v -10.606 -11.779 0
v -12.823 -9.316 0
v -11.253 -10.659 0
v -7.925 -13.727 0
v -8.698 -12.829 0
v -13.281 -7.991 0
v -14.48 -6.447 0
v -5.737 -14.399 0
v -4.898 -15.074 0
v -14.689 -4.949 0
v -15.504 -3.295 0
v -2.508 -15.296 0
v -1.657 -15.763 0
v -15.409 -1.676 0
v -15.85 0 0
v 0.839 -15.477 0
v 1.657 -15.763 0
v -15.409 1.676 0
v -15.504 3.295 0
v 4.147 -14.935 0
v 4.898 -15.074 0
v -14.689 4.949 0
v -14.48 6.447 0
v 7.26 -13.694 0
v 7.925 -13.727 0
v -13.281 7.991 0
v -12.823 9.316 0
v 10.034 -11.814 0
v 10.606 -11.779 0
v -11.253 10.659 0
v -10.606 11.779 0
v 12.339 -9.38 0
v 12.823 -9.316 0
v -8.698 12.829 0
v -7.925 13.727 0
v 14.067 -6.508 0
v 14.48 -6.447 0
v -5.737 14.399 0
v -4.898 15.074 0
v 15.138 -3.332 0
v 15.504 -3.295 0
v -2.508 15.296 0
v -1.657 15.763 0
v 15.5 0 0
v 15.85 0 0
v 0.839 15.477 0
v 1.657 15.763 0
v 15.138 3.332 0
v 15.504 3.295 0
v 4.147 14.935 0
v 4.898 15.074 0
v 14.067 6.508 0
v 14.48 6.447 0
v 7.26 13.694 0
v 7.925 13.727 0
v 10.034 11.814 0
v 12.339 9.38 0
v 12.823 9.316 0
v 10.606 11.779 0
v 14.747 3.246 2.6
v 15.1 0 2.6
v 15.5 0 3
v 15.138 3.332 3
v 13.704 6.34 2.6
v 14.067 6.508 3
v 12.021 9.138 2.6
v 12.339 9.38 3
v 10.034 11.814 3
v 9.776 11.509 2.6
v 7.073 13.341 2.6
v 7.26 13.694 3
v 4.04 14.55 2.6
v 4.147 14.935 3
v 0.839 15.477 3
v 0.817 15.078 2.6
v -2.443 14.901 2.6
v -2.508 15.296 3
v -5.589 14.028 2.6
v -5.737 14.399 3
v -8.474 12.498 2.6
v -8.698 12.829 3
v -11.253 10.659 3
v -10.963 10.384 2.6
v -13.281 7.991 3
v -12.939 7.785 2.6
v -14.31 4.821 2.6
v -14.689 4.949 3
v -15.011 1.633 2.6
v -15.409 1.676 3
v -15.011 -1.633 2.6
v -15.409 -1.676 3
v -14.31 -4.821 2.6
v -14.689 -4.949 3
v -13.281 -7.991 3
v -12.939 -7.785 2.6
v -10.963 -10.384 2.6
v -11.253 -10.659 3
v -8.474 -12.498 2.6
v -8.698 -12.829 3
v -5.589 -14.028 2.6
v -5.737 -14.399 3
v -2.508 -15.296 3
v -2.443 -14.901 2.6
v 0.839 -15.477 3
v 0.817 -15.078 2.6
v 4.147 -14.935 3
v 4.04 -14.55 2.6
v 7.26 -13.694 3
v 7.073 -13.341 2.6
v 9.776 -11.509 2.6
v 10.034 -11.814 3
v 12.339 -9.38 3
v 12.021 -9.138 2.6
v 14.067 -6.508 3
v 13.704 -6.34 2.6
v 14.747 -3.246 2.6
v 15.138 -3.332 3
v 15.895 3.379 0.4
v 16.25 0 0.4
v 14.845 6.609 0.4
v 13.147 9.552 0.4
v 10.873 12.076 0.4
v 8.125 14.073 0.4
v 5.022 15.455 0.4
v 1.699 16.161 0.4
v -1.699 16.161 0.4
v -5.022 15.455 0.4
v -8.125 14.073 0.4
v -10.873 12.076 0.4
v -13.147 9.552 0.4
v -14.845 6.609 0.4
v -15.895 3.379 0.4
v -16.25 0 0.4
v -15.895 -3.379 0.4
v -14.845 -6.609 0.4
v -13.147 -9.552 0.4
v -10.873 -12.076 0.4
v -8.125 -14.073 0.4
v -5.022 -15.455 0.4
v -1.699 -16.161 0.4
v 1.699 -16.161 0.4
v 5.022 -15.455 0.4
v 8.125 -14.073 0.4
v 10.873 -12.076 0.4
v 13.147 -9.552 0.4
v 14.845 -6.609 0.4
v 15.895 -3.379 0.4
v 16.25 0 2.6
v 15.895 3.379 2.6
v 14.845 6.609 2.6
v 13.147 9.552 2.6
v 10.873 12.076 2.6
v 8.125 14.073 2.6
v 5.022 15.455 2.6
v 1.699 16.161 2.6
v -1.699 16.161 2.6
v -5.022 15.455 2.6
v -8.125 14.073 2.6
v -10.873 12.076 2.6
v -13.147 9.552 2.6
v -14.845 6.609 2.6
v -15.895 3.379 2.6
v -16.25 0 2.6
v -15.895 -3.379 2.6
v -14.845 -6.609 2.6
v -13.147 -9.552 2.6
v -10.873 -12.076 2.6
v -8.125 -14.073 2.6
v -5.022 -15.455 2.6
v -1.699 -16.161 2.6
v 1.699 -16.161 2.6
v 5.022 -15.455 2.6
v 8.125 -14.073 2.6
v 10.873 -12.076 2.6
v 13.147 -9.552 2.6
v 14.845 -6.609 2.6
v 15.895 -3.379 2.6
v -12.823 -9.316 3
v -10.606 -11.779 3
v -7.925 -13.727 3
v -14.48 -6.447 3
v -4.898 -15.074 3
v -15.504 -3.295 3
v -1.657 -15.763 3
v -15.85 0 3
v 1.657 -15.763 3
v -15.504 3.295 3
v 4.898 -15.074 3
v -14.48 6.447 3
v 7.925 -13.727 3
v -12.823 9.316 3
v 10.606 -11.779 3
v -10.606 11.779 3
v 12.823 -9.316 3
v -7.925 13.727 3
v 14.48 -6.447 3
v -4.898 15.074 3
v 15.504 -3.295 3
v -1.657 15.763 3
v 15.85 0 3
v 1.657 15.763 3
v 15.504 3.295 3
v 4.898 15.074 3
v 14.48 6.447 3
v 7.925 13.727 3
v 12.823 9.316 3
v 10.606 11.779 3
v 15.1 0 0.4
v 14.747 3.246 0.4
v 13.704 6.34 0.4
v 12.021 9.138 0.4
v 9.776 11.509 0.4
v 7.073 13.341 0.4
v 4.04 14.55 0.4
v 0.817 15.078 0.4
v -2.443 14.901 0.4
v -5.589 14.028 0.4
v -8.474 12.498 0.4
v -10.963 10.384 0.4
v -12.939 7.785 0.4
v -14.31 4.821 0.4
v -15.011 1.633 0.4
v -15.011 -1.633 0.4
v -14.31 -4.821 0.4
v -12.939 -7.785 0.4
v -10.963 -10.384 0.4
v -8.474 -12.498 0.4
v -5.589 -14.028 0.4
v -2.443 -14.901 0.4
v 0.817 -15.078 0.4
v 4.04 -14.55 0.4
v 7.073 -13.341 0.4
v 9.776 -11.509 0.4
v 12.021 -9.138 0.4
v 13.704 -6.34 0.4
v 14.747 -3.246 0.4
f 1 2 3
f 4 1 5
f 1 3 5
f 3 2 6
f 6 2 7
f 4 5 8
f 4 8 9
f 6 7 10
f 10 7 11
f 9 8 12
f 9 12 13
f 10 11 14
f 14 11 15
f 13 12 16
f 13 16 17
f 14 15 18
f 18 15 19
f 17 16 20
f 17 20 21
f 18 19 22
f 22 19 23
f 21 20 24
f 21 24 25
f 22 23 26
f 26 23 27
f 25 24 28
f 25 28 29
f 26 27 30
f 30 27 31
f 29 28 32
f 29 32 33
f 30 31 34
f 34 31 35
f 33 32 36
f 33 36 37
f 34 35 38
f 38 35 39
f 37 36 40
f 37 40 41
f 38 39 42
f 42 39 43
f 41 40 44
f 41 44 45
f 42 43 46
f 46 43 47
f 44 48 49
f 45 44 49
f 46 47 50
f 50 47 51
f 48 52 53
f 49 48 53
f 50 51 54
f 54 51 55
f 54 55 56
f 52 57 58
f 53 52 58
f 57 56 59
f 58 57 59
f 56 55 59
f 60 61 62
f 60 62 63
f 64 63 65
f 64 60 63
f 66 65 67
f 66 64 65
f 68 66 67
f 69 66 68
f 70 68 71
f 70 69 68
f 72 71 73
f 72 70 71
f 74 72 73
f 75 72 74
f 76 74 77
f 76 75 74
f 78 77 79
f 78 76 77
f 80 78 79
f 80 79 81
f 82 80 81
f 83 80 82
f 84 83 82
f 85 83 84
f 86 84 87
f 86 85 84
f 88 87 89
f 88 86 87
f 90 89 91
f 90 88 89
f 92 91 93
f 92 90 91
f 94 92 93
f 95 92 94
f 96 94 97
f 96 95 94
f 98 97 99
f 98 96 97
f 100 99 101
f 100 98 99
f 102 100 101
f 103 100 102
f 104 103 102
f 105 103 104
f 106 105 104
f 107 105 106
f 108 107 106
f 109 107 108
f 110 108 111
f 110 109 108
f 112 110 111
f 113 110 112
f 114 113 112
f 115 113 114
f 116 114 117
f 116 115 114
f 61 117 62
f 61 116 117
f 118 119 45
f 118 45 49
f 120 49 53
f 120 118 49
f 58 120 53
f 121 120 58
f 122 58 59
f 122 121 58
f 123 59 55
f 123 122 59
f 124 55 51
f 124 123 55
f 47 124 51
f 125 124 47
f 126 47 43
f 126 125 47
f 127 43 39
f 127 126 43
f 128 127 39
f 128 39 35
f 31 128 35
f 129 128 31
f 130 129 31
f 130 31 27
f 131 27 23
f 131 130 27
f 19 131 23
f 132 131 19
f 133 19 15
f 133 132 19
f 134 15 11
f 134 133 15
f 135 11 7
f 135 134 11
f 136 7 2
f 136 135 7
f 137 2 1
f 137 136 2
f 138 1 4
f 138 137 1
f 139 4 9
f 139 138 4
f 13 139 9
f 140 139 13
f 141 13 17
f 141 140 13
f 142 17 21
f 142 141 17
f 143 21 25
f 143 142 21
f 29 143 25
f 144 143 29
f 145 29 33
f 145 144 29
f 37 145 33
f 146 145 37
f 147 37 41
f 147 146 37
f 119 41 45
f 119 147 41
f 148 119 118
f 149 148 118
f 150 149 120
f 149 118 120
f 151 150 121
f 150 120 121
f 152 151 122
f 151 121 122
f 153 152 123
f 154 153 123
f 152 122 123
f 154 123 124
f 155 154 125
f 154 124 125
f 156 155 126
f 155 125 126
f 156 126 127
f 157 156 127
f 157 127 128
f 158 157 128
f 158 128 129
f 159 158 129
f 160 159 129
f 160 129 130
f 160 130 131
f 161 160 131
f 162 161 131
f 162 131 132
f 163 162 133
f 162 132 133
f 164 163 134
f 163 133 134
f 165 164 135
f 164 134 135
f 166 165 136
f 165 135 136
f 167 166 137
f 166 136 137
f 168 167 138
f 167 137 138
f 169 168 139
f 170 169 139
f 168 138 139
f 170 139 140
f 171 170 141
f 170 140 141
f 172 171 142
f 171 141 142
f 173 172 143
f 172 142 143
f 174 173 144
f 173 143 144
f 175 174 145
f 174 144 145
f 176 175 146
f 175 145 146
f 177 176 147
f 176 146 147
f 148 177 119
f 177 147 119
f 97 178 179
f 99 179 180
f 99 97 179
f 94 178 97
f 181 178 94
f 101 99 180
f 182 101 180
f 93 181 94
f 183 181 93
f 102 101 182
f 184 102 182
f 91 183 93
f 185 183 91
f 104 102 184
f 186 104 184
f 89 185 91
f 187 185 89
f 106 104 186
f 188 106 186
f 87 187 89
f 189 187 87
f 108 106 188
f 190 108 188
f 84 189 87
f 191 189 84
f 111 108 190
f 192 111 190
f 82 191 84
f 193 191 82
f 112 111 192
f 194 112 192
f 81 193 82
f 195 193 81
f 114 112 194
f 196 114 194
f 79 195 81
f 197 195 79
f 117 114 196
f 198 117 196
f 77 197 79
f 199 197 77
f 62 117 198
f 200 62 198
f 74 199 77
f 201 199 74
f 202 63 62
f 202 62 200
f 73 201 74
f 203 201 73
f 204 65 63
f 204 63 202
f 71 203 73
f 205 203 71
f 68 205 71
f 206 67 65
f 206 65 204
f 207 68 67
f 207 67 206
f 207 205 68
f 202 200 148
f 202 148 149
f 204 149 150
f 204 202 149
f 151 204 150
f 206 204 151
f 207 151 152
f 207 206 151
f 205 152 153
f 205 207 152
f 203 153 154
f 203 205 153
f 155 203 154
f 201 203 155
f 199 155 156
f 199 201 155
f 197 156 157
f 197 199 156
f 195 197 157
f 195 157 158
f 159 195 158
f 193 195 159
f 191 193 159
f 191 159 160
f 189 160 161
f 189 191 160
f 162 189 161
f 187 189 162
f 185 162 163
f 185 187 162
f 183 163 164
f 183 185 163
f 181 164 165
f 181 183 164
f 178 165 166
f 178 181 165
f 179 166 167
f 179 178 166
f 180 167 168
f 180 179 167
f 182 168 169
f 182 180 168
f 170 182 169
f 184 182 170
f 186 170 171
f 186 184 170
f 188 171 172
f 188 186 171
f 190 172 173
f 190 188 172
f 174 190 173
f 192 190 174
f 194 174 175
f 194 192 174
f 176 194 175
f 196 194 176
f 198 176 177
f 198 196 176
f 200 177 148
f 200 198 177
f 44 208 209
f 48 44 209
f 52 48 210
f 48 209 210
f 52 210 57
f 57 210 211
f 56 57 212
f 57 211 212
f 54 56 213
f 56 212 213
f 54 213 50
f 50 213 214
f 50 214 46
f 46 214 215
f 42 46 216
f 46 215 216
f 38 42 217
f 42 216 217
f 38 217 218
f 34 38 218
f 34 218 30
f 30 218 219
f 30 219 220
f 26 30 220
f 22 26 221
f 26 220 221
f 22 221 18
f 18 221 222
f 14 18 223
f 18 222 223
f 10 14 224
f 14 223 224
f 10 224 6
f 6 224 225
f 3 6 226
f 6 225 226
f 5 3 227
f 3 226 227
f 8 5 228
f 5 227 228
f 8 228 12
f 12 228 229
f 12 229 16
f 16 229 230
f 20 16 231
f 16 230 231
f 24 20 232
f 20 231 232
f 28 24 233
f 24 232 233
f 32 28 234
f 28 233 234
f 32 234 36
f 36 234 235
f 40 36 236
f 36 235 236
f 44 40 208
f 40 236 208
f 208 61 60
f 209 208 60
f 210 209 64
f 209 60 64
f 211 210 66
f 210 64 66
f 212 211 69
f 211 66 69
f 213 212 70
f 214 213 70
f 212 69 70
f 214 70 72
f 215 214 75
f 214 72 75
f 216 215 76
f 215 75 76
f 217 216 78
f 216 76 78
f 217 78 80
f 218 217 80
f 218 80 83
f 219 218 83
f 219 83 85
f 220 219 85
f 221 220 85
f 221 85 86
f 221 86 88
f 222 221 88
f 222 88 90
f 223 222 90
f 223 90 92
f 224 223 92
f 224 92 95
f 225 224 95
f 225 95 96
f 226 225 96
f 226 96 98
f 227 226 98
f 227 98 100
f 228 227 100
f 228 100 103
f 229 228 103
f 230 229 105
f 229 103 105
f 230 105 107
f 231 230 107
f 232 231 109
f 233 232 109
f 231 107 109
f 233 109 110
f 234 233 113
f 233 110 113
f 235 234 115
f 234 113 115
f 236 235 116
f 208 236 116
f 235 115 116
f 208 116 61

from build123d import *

# Parameters (mm, degrees)
F0_R     = 16.25
F1_DEPTH = 3
F2_R     = 15.1
F3_DEPTH = 3.001
F4_SIZE  = 0.4
F5_SIZE  = 0.4


with BuildPart() as f1:
    # F0 (on Top) → F1 (new body)
    with BuildSketch(Plane.XY):
        Circle(F0_R)
    extrude(amount=F1_DEPTH)

    # F2 (on face) → F3 (cut, through all)
    with BuildSketch(Plane.XY.offset(3)):
        Circle(F2_R)
    extrude(amount=-F3_DEPTH, mode=Mode.SUBTRACT)

    # F4
    f4_edges = [f1.edges().sort_by_distance(p)[0] for p in [
        (-15.1, 0, 3),
        (-15.1, 0, 0),
    ]]
    chamfer(f4_edges, length=F4_SIZE)

    # F5
    f5_edges = [f1.edges().sort_by_distance(p)[0] for p in [
        (-16.25, 0, 0),
        (-16.25, 0, 3),
    ]]
    chamfer(f5_edges, length=F5_SIZE)


solid = f1.part
